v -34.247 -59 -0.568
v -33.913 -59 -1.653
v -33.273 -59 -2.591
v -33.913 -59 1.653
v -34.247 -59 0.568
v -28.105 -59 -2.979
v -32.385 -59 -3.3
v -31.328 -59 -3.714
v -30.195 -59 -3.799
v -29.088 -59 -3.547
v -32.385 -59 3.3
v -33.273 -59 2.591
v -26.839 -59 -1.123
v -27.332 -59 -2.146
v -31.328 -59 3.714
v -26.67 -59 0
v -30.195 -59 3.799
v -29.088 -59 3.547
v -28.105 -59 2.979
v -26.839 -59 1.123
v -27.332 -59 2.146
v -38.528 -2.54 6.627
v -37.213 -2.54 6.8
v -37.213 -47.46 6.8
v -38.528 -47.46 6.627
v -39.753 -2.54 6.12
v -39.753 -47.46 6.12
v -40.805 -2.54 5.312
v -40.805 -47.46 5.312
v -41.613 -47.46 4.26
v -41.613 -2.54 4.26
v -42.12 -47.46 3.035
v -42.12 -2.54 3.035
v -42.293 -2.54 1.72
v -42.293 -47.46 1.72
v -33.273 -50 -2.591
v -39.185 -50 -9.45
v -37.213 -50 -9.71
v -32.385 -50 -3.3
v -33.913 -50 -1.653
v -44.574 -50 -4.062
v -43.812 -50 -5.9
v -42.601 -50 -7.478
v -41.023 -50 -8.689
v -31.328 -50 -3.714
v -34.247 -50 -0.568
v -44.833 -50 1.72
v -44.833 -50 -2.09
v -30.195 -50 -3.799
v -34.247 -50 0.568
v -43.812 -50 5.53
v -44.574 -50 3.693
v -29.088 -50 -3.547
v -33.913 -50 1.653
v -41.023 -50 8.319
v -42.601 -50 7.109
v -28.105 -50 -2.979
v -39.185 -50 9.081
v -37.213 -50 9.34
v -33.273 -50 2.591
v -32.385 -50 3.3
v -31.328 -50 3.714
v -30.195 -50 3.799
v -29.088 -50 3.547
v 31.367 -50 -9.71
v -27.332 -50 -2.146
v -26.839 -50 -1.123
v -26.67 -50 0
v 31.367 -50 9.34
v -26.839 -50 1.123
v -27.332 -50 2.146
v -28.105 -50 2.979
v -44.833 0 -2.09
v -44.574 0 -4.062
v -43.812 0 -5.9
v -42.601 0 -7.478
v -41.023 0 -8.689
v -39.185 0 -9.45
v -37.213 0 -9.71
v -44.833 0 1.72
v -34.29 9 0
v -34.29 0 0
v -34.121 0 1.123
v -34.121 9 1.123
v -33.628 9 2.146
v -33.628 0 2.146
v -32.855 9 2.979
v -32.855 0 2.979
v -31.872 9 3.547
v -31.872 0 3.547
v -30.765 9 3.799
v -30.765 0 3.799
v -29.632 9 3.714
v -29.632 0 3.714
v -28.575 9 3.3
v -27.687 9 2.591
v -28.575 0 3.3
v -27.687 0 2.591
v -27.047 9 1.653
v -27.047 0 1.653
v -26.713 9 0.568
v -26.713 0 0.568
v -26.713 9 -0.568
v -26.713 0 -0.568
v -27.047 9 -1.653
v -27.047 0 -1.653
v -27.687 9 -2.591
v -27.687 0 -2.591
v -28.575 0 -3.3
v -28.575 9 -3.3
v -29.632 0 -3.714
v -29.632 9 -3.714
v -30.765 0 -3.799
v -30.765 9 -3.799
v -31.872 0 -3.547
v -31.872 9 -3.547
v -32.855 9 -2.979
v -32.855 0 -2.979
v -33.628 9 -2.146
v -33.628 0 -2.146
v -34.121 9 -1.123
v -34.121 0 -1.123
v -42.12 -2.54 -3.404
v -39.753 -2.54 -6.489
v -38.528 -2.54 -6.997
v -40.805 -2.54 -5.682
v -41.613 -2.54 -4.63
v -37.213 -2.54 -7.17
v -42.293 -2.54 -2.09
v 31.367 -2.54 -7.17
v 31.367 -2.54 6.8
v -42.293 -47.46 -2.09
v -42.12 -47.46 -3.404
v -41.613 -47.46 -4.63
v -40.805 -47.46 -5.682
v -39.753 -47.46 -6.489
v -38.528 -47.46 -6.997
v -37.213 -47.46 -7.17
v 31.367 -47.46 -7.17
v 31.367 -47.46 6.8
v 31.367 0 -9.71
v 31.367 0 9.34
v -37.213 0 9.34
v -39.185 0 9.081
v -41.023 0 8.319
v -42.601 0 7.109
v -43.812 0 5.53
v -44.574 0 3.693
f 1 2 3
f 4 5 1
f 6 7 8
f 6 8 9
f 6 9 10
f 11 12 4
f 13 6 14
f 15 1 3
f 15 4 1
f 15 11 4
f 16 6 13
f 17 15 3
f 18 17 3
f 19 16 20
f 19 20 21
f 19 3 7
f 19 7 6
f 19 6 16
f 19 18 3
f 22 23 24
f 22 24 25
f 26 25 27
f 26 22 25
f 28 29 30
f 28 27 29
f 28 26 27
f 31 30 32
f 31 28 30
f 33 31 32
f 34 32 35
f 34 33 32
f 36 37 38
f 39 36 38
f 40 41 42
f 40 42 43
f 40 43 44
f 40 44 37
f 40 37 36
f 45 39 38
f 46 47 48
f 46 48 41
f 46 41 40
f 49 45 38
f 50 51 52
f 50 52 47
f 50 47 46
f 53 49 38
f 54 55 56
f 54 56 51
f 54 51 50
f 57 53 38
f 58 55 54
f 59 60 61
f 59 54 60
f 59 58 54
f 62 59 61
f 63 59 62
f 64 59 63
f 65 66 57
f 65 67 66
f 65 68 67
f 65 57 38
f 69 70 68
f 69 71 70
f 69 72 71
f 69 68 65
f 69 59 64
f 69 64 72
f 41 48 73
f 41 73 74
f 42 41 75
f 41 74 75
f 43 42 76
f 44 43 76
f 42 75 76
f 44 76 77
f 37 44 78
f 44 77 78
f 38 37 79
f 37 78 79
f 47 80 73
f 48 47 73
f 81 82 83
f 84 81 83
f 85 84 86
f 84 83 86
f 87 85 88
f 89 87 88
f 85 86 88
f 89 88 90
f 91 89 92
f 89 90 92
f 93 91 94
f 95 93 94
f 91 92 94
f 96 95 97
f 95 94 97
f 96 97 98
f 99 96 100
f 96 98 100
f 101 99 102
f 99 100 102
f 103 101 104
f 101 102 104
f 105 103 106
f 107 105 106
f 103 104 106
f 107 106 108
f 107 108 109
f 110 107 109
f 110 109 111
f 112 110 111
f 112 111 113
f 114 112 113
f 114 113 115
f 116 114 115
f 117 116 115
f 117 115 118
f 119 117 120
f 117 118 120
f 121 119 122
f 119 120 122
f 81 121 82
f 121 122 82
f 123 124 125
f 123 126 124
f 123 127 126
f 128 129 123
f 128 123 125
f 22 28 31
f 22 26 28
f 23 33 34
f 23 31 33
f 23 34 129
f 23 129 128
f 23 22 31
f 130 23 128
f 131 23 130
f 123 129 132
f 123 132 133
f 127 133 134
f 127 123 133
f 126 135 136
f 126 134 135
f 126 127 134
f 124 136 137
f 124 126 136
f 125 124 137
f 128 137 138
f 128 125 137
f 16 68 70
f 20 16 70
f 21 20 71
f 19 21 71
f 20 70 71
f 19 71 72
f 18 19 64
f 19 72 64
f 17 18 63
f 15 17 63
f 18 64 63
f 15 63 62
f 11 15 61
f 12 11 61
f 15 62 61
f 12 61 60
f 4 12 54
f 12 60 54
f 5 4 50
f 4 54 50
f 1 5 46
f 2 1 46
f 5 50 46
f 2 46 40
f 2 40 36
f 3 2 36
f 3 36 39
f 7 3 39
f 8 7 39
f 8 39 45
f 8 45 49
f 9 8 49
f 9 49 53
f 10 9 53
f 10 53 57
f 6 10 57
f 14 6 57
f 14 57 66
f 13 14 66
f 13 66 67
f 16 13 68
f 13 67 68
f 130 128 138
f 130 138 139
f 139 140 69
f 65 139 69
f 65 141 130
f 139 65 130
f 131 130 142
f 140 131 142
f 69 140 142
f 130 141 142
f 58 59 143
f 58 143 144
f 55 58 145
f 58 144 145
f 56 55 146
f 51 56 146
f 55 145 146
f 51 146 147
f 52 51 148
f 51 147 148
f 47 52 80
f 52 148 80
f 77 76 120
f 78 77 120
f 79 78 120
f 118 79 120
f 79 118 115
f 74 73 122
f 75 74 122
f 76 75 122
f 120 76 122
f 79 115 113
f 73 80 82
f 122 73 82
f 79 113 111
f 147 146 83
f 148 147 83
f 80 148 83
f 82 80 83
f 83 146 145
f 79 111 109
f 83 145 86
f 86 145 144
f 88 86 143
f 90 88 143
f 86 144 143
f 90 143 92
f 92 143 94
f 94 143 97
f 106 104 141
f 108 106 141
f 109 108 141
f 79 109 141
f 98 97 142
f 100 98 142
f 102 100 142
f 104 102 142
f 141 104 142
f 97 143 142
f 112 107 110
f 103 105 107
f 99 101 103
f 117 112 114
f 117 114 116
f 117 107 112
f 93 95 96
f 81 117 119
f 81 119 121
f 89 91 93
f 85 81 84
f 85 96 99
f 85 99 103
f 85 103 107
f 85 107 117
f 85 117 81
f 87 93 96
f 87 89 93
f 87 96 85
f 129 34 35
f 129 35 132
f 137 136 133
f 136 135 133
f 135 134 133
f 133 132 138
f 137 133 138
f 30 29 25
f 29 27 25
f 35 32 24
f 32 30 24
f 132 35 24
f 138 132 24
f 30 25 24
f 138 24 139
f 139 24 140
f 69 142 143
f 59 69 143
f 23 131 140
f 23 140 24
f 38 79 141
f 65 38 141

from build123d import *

# Parameters (mm, degrees)
F1_DEPTH = 50
F2_T     = -2.54
F3_R     = 3.81
F4_DEPTH = 9
F5_R     = 3.81
F6_DEPTH = 9


with BuildPart() as f1:
    # F0 (on Front) → F1 (new body)
    with BuildSketch(Plane.XZ):
        with BuildLine():
            Line((31.366751, 9.340362), (-37.213249, 9.340362))
            ThreePointArc((-37.213249, 9.340362), (-42.601402, 7.108516), (-44.833249, 1.720362))
            Line((-44.833249, 1.720362), (-44.833249, -2.089638))
            ThreePointArc((-44.833249, -2.089638), (-42.601402, -7.477792), (-37.213249, -9.709638))
            Line((-37.213249, -9.709638), (31.366751, -9.709638))
            Line((31.366751, -9.709638), (31.366751, 9.340362))
        make_face()
    extrude(amount=F1_DEPTH)

    # F2
    f2_openings = [f1.faces().sort_by_distance(p)[0] for p in [
        (31.366751, -25, -0.184638),
    ]]
    offset(amount=F2_T, openings=f2_openings)

    # F3 (on face) → F4 (join)
    with BuildSketch(Plane.XZ.offset(50)):
        with Locations((-30.48, 0)):
            Circle(F3_R)
    extrude(amount=F4_DEPTH)

    # F5 (on face) → F6 (join)
    with BuildSketch(Plane(origin=(0, 0, 0), x_dir=(-1, 0, 0), z_dir=(0, 1, 0))):
        with Locations((30.48, 0)):
            Circle(F5_R)
    extrude(amount=F6_DEPTH)


solid = f1.part
